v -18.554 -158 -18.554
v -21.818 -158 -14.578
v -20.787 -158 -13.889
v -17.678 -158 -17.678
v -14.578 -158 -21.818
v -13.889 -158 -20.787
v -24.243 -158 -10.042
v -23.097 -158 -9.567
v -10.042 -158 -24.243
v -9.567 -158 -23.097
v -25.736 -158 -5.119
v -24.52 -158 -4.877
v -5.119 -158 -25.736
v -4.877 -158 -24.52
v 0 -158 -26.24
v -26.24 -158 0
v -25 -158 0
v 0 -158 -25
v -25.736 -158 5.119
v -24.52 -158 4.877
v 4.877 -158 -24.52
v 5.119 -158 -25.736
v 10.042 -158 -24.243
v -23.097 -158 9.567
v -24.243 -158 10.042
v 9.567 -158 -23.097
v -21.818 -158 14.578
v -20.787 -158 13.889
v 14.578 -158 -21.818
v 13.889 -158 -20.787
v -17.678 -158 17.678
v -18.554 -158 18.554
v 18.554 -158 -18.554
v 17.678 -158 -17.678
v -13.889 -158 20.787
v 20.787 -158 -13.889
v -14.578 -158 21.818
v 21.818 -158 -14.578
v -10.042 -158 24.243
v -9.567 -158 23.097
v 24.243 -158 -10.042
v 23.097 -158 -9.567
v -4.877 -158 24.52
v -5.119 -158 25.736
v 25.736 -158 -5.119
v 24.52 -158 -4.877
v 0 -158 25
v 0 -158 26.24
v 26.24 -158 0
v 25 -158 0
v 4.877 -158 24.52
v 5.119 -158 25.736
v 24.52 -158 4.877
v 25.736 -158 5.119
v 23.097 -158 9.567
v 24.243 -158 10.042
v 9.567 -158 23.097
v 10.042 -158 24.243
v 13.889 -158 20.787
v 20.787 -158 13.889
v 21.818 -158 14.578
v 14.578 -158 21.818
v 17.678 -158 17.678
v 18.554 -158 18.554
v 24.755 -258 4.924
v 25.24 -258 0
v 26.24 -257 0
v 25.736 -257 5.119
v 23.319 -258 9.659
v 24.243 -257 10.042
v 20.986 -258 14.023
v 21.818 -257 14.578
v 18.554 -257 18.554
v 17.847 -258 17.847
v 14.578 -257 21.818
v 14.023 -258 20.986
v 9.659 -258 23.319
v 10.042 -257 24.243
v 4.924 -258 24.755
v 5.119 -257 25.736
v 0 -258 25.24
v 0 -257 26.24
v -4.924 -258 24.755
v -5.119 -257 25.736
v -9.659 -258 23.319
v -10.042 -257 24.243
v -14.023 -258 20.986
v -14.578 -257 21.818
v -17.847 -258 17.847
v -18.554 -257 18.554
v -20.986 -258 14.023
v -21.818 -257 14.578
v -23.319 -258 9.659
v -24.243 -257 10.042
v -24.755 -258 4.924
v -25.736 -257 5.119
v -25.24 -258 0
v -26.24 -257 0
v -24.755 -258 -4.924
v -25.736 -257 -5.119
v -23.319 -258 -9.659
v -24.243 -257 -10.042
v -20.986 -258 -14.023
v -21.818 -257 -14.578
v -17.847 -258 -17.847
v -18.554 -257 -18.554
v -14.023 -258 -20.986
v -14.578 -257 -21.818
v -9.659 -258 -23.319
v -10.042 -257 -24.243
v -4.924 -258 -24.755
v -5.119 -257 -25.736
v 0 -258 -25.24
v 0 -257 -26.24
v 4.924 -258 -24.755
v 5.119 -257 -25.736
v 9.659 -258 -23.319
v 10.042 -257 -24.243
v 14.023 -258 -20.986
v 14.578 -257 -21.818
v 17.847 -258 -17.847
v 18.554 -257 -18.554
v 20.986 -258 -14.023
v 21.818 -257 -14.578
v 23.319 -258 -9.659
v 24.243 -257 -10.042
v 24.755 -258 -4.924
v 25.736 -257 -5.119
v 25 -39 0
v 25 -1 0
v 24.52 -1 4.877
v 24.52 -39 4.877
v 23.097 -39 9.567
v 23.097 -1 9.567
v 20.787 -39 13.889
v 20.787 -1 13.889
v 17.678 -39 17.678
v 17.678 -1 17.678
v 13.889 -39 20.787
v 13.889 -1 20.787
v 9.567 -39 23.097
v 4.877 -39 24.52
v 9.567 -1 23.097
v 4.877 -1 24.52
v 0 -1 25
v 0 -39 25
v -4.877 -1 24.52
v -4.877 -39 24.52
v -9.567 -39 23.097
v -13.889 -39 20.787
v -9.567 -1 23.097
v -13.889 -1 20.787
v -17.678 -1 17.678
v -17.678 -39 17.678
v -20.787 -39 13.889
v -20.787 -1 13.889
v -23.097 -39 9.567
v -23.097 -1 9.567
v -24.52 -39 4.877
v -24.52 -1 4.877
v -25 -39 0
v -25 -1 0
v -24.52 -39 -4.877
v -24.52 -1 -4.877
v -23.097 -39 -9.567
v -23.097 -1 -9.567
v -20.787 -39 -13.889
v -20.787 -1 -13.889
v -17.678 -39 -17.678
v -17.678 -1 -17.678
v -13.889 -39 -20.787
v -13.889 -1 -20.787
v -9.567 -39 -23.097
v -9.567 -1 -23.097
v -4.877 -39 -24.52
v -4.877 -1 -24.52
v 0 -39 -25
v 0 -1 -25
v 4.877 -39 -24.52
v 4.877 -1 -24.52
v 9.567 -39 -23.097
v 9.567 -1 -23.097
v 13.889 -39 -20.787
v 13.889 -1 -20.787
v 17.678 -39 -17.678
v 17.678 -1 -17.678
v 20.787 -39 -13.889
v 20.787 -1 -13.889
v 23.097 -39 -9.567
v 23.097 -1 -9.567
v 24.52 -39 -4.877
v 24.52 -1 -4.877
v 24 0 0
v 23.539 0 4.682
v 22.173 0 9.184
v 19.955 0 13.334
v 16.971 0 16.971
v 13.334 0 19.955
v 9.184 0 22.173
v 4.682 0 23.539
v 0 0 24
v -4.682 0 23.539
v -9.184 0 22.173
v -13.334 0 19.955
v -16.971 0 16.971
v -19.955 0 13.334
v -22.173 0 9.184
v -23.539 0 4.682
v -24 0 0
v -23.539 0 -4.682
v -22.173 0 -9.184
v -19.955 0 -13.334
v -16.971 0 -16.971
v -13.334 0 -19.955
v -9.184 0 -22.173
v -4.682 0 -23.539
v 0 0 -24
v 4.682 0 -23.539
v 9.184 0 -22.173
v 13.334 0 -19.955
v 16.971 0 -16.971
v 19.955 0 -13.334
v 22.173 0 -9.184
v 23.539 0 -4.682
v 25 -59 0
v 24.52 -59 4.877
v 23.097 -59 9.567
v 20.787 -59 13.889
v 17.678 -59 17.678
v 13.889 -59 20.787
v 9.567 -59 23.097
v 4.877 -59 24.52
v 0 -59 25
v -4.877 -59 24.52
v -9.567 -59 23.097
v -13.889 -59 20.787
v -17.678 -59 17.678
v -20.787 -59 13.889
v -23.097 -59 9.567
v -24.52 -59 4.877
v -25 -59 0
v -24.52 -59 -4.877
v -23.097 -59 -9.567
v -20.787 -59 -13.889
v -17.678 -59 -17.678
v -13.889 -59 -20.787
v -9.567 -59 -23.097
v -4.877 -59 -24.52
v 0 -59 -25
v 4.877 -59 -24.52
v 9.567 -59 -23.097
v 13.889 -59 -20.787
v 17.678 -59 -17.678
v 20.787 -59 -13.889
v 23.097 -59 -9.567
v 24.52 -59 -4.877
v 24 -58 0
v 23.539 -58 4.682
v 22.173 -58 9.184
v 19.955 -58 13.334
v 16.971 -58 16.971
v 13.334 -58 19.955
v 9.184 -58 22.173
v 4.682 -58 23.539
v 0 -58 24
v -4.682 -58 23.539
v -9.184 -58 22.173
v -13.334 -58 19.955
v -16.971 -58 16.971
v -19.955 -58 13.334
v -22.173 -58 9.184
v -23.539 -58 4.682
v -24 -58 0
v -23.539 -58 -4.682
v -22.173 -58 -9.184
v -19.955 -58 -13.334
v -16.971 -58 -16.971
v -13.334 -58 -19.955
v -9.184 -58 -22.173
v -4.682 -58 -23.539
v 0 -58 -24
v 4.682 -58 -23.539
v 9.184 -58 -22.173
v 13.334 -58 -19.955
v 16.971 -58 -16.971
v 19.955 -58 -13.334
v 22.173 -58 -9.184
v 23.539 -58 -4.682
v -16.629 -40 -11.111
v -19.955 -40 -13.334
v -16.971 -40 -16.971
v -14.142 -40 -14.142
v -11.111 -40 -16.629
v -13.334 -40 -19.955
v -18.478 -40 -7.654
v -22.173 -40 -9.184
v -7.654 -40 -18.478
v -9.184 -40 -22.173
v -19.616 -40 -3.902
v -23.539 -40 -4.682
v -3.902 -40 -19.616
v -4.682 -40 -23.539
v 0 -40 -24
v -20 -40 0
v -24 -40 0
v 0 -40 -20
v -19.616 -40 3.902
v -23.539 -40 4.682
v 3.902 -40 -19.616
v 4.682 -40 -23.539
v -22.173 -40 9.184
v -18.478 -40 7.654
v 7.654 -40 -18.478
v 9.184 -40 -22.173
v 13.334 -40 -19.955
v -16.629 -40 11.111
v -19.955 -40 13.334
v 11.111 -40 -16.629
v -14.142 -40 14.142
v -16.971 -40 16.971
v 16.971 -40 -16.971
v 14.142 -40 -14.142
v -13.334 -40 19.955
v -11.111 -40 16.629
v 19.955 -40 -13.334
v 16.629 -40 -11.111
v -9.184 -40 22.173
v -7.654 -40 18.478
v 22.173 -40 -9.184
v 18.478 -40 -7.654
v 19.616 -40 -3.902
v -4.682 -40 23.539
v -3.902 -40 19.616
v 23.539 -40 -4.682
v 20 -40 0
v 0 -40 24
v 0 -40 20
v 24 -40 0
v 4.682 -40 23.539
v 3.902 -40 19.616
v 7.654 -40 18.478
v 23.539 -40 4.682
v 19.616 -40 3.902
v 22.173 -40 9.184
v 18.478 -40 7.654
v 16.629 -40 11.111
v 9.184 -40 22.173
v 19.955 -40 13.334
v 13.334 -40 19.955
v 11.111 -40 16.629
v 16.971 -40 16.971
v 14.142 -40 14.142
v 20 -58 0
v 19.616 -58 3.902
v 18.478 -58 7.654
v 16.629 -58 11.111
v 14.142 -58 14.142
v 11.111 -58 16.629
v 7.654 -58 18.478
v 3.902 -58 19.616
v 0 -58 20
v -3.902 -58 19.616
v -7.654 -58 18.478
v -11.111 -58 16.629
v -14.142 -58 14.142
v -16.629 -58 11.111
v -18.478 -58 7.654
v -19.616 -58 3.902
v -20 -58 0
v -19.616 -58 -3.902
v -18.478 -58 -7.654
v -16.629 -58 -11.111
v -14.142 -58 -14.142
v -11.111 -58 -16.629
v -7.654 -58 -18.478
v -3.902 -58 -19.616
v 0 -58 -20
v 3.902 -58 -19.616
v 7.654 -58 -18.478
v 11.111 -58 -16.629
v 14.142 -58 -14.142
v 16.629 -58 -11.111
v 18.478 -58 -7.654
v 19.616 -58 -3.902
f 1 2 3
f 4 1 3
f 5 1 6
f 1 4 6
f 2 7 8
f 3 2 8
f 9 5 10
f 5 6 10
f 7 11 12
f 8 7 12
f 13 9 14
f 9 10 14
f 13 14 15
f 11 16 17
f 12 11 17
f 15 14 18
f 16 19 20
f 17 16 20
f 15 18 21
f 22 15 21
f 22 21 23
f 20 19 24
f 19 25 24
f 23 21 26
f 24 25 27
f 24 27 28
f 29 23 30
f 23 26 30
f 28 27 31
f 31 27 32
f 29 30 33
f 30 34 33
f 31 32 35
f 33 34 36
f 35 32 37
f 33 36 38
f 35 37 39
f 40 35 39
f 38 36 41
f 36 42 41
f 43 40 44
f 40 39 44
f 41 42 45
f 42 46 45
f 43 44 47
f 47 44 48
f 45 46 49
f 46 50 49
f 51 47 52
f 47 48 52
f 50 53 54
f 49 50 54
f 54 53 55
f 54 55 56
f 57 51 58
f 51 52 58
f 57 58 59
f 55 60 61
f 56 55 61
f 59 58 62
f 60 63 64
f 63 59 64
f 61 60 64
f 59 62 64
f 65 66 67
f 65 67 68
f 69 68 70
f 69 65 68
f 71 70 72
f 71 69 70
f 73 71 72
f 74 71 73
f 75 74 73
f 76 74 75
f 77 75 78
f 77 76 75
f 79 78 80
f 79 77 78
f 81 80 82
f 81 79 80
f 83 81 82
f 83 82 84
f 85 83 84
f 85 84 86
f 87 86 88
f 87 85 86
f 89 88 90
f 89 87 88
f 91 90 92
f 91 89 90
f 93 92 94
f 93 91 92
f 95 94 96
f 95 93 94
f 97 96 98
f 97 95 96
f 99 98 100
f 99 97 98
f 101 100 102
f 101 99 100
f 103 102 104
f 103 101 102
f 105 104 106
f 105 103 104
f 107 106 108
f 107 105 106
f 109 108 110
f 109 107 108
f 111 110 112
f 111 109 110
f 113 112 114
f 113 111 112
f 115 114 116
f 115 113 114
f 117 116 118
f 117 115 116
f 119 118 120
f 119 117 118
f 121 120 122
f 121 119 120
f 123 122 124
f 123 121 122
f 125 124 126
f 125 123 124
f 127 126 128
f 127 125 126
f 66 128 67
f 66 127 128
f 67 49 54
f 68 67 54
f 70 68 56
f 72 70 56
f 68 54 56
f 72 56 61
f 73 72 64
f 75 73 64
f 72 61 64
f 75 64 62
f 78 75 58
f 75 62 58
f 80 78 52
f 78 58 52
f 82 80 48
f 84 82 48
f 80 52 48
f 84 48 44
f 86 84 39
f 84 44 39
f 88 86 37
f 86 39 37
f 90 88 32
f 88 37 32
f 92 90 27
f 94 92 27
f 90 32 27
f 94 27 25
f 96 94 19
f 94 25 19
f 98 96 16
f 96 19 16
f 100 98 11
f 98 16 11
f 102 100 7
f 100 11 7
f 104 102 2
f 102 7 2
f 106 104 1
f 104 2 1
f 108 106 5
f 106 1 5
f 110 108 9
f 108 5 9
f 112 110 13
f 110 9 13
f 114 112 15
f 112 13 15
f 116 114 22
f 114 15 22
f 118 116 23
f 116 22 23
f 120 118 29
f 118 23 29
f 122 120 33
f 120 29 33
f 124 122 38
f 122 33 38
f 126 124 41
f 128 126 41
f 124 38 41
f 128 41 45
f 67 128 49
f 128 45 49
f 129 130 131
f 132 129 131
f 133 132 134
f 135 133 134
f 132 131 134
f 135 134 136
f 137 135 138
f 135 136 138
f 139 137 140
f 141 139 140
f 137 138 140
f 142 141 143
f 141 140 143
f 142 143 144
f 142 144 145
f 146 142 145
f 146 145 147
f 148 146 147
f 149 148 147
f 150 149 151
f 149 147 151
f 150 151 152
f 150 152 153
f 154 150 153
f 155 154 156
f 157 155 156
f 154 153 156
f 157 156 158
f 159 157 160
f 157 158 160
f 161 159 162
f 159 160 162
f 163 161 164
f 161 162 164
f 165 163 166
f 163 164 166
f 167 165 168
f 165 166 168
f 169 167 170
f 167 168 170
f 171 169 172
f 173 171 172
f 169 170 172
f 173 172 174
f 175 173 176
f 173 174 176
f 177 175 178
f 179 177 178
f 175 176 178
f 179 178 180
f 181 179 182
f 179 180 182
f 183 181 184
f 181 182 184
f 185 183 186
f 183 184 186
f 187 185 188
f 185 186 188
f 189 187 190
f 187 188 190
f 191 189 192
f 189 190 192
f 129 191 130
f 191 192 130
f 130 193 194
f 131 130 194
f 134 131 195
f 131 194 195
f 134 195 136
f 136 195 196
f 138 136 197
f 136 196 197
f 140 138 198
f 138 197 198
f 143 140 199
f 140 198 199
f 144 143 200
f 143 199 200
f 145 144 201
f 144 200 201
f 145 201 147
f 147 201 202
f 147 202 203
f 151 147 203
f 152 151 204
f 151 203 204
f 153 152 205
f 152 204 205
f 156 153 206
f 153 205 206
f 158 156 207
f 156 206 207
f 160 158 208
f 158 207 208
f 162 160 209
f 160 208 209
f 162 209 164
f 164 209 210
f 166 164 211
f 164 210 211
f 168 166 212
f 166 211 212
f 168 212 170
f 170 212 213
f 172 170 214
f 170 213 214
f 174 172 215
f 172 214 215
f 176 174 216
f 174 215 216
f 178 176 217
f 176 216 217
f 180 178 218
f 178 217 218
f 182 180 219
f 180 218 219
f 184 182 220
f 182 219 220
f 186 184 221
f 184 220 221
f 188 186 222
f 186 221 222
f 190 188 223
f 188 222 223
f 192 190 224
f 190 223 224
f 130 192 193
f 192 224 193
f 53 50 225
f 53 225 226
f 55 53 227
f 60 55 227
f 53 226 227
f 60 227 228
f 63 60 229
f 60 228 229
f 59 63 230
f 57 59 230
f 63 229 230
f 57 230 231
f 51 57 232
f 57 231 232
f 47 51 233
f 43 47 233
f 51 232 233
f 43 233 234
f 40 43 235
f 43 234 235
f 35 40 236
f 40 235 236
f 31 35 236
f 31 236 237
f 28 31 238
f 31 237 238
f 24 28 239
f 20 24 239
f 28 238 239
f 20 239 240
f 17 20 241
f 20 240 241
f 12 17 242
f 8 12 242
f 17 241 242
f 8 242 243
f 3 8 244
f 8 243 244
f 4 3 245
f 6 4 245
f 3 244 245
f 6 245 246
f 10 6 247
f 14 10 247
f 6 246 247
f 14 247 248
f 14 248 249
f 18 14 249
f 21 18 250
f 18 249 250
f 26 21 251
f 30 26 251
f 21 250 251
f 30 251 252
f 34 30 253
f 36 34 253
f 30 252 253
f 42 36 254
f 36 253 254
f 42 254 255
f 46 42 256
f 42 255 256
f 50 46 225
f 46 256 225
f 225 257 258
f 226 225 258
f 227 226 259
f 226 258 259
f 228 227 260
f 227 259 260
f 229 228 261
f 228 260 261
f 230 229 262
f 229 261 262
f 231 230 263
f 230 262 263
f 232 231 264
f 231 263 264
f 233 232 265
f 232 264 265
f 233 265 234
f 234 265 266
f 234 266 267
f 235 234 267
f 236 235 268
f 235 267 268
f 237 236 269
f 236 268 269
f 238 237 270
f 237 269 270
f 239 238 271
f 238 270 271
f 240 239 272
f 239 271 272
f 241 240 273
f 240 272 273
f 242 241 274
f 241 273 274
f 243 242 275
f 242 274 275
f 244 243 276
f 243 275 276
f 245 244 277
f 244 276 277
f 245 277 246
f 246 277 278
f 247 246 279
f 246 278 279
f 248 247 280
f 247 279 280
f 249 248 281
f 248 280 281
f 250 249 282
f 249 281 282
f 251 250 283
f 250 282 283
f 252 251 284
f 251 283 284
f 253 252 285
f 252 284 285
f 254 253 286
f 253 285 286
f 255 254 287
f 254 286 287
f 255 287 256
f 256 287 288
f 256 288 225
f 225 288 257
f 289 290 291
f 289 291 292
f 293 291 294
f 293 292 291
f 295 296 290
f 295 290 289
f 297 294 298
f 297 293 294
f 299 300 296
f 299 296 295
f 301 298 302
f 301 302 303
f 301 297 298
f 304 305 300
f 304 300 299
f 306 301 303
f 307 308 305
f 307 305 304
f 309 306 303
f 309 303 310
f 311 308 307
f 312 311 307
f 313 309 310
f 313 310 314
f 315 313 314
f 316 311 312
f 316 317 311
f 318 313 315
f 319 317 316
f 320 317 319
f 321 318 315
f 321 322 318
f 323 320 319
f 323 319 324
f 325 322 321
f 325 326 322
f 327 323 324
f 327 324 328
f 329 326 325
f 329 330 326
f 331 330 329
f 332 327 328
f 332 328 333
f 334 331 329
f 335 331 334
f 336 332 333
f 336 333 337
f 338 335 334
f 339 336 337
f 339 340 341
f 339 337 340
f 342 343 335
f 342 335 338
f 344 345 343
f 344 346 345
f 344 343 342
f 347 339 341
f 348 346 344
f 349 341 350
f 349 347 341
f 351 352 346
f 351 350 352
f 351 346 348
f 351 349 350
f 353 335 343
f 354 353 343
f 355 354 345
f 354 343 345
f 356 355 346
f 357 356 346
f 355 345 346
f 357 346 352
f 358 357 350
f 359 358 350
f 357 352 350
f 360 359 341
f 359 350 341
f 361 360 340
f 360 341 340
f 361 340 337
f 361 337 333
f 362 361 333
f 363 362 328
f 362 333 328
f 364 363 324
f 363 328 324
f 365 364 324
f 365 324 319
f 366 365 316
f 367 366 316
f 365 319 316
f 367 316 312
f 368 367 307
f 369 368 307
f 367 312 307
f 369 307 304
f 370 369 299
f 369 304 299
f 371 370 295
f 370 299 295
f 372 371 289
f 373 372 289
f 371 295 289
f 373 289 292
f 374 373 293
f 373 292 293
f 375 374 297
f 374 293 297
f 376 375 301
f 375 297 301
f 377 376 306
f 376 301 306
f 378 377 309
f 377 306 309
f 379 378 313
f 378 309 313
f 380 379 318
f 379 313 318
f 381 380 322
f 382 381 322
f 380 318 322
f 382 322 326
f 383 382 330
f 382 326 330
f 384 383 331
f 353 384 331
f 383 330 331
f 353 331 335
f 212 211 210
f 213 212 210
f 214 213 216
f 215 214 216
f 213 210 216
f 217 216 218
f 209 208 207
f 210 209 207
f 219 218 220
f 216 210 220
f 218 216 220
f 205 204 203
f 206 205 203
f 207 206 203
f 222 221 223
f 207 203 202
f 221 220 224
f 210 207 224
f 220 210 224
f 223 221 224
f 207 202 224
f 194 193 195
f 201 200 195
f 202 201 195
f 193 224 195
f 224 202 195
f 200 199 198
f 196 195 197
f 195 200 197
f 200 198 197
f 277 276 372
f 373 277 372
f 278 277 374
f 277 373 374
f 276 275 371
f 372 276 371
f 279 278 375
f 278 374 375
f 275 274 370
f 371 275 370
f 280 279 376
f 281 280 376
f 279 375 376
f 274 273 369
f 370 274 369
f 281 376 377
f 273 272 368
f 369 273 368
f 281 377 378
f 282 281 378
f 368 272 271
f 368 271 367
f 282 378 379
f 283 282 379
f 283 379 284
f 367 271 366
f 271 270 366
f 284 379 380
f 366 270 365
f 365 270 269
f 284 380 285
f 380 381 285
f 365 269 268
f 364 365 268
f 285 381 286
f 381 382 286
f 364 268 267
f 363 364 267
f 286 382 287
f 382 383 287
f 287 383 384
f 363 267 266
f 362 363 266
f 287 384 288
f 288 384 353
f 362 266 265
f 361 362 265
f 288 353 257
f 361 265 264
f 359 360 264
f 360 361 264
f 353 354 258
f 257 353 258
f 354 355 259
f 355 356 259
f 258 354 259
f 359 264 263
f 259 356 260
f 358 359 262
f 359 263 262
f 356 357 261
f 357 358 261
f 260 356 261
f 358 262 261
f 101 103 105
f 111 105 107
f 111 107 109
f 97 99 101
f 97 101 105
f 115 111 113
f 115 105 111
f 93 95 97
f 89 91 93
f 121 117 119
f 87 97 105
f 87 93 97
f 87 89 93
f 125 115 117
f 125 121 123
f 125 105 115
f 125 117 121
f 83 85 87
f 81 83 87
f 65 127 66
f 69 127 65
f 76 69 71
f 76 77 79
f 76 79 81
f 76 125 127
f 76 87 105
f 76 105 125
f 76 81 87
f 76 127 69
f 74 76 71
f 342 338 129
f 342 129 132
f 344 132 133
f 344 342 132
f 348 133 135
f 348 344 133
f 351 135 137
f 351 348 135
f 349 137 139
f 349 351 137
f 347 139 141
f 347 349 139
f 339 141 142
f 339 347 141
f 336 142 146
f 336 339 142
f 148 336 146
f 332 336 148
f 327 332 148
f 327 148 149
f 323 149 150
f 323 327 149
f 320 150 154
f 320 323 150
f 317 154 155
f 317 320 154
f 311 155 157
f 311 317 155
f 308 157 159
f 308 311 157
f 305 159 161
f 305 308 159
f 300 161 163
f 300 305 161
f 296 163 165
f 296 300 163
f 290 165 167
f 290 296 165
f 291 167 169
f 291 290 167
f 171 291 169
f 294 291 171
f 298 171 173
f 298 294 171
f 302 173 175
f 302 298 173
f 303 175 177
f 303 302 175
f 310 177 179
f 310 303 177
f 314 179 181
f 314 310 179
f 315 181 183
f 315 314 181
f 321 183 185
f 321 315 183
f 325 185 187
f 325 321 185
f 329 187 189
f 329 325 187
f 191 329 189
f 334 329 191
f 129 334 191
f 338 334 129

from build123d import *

# Parameters (mm, degrees)
F0_R     = 25
F1_DEPTH = 40
F2_R     = 20
F3_DEPTH = 18
F4_SIZE  = 1
F5_R     = 25
F6_DEPTH = 100
F7_SIZE  = 1
F8_R     = 26.24
F9_DEPTH = 100
F10_SIZE = 1


with BuildPart() as f1:
    # F0 (on Front) → F1 (new body)
    with BuildSketch(Plane.XZ):
        Circle(F0_R)
    extrude(amount=F1_DEPTH)

    # F2 (on face) → F3 (join)
    with BuildSketch(Plane.XZ.offset(40)):
        Circle(F2_R)
    extrude(amount=F3_DEPTH)

    # F4
    f4_edges = [f1.edges().sort_by_distance(p)[0] for p in [
        (-25, -40, 0),
        (-25, 0, 0),
    ]]
    chamfer(f4_edges, length=F4_SIZE)

    # F5 (on face) → F6 (join)
    with BuildSketch(Plane.XZ.offset(58)):
        Circle(F5_R)
    extrude(amount=F6_DEPTH)

    # F7
    f7_edges = [f1.edges().sort_by_distance(p)[0] for p in [
        (-25, -58, 0),
    ]]
    chamfer(f7_edges, length=F7_SIZE)

    # F8 (on face) → F9 (join)
    with BuildSketch(Plane.XZ.offset(158)):
        Circle(F8_R)
    extrude(amount=F9_DEPTH)

    # F10
    f10_edges = [f1.edges().sort_by_distance(p)[0] for p in [
        (-26.24, -258, 0),
    ]]
    chamfer(f10_edges, length=F10_SIZE)


solid = f1.part
